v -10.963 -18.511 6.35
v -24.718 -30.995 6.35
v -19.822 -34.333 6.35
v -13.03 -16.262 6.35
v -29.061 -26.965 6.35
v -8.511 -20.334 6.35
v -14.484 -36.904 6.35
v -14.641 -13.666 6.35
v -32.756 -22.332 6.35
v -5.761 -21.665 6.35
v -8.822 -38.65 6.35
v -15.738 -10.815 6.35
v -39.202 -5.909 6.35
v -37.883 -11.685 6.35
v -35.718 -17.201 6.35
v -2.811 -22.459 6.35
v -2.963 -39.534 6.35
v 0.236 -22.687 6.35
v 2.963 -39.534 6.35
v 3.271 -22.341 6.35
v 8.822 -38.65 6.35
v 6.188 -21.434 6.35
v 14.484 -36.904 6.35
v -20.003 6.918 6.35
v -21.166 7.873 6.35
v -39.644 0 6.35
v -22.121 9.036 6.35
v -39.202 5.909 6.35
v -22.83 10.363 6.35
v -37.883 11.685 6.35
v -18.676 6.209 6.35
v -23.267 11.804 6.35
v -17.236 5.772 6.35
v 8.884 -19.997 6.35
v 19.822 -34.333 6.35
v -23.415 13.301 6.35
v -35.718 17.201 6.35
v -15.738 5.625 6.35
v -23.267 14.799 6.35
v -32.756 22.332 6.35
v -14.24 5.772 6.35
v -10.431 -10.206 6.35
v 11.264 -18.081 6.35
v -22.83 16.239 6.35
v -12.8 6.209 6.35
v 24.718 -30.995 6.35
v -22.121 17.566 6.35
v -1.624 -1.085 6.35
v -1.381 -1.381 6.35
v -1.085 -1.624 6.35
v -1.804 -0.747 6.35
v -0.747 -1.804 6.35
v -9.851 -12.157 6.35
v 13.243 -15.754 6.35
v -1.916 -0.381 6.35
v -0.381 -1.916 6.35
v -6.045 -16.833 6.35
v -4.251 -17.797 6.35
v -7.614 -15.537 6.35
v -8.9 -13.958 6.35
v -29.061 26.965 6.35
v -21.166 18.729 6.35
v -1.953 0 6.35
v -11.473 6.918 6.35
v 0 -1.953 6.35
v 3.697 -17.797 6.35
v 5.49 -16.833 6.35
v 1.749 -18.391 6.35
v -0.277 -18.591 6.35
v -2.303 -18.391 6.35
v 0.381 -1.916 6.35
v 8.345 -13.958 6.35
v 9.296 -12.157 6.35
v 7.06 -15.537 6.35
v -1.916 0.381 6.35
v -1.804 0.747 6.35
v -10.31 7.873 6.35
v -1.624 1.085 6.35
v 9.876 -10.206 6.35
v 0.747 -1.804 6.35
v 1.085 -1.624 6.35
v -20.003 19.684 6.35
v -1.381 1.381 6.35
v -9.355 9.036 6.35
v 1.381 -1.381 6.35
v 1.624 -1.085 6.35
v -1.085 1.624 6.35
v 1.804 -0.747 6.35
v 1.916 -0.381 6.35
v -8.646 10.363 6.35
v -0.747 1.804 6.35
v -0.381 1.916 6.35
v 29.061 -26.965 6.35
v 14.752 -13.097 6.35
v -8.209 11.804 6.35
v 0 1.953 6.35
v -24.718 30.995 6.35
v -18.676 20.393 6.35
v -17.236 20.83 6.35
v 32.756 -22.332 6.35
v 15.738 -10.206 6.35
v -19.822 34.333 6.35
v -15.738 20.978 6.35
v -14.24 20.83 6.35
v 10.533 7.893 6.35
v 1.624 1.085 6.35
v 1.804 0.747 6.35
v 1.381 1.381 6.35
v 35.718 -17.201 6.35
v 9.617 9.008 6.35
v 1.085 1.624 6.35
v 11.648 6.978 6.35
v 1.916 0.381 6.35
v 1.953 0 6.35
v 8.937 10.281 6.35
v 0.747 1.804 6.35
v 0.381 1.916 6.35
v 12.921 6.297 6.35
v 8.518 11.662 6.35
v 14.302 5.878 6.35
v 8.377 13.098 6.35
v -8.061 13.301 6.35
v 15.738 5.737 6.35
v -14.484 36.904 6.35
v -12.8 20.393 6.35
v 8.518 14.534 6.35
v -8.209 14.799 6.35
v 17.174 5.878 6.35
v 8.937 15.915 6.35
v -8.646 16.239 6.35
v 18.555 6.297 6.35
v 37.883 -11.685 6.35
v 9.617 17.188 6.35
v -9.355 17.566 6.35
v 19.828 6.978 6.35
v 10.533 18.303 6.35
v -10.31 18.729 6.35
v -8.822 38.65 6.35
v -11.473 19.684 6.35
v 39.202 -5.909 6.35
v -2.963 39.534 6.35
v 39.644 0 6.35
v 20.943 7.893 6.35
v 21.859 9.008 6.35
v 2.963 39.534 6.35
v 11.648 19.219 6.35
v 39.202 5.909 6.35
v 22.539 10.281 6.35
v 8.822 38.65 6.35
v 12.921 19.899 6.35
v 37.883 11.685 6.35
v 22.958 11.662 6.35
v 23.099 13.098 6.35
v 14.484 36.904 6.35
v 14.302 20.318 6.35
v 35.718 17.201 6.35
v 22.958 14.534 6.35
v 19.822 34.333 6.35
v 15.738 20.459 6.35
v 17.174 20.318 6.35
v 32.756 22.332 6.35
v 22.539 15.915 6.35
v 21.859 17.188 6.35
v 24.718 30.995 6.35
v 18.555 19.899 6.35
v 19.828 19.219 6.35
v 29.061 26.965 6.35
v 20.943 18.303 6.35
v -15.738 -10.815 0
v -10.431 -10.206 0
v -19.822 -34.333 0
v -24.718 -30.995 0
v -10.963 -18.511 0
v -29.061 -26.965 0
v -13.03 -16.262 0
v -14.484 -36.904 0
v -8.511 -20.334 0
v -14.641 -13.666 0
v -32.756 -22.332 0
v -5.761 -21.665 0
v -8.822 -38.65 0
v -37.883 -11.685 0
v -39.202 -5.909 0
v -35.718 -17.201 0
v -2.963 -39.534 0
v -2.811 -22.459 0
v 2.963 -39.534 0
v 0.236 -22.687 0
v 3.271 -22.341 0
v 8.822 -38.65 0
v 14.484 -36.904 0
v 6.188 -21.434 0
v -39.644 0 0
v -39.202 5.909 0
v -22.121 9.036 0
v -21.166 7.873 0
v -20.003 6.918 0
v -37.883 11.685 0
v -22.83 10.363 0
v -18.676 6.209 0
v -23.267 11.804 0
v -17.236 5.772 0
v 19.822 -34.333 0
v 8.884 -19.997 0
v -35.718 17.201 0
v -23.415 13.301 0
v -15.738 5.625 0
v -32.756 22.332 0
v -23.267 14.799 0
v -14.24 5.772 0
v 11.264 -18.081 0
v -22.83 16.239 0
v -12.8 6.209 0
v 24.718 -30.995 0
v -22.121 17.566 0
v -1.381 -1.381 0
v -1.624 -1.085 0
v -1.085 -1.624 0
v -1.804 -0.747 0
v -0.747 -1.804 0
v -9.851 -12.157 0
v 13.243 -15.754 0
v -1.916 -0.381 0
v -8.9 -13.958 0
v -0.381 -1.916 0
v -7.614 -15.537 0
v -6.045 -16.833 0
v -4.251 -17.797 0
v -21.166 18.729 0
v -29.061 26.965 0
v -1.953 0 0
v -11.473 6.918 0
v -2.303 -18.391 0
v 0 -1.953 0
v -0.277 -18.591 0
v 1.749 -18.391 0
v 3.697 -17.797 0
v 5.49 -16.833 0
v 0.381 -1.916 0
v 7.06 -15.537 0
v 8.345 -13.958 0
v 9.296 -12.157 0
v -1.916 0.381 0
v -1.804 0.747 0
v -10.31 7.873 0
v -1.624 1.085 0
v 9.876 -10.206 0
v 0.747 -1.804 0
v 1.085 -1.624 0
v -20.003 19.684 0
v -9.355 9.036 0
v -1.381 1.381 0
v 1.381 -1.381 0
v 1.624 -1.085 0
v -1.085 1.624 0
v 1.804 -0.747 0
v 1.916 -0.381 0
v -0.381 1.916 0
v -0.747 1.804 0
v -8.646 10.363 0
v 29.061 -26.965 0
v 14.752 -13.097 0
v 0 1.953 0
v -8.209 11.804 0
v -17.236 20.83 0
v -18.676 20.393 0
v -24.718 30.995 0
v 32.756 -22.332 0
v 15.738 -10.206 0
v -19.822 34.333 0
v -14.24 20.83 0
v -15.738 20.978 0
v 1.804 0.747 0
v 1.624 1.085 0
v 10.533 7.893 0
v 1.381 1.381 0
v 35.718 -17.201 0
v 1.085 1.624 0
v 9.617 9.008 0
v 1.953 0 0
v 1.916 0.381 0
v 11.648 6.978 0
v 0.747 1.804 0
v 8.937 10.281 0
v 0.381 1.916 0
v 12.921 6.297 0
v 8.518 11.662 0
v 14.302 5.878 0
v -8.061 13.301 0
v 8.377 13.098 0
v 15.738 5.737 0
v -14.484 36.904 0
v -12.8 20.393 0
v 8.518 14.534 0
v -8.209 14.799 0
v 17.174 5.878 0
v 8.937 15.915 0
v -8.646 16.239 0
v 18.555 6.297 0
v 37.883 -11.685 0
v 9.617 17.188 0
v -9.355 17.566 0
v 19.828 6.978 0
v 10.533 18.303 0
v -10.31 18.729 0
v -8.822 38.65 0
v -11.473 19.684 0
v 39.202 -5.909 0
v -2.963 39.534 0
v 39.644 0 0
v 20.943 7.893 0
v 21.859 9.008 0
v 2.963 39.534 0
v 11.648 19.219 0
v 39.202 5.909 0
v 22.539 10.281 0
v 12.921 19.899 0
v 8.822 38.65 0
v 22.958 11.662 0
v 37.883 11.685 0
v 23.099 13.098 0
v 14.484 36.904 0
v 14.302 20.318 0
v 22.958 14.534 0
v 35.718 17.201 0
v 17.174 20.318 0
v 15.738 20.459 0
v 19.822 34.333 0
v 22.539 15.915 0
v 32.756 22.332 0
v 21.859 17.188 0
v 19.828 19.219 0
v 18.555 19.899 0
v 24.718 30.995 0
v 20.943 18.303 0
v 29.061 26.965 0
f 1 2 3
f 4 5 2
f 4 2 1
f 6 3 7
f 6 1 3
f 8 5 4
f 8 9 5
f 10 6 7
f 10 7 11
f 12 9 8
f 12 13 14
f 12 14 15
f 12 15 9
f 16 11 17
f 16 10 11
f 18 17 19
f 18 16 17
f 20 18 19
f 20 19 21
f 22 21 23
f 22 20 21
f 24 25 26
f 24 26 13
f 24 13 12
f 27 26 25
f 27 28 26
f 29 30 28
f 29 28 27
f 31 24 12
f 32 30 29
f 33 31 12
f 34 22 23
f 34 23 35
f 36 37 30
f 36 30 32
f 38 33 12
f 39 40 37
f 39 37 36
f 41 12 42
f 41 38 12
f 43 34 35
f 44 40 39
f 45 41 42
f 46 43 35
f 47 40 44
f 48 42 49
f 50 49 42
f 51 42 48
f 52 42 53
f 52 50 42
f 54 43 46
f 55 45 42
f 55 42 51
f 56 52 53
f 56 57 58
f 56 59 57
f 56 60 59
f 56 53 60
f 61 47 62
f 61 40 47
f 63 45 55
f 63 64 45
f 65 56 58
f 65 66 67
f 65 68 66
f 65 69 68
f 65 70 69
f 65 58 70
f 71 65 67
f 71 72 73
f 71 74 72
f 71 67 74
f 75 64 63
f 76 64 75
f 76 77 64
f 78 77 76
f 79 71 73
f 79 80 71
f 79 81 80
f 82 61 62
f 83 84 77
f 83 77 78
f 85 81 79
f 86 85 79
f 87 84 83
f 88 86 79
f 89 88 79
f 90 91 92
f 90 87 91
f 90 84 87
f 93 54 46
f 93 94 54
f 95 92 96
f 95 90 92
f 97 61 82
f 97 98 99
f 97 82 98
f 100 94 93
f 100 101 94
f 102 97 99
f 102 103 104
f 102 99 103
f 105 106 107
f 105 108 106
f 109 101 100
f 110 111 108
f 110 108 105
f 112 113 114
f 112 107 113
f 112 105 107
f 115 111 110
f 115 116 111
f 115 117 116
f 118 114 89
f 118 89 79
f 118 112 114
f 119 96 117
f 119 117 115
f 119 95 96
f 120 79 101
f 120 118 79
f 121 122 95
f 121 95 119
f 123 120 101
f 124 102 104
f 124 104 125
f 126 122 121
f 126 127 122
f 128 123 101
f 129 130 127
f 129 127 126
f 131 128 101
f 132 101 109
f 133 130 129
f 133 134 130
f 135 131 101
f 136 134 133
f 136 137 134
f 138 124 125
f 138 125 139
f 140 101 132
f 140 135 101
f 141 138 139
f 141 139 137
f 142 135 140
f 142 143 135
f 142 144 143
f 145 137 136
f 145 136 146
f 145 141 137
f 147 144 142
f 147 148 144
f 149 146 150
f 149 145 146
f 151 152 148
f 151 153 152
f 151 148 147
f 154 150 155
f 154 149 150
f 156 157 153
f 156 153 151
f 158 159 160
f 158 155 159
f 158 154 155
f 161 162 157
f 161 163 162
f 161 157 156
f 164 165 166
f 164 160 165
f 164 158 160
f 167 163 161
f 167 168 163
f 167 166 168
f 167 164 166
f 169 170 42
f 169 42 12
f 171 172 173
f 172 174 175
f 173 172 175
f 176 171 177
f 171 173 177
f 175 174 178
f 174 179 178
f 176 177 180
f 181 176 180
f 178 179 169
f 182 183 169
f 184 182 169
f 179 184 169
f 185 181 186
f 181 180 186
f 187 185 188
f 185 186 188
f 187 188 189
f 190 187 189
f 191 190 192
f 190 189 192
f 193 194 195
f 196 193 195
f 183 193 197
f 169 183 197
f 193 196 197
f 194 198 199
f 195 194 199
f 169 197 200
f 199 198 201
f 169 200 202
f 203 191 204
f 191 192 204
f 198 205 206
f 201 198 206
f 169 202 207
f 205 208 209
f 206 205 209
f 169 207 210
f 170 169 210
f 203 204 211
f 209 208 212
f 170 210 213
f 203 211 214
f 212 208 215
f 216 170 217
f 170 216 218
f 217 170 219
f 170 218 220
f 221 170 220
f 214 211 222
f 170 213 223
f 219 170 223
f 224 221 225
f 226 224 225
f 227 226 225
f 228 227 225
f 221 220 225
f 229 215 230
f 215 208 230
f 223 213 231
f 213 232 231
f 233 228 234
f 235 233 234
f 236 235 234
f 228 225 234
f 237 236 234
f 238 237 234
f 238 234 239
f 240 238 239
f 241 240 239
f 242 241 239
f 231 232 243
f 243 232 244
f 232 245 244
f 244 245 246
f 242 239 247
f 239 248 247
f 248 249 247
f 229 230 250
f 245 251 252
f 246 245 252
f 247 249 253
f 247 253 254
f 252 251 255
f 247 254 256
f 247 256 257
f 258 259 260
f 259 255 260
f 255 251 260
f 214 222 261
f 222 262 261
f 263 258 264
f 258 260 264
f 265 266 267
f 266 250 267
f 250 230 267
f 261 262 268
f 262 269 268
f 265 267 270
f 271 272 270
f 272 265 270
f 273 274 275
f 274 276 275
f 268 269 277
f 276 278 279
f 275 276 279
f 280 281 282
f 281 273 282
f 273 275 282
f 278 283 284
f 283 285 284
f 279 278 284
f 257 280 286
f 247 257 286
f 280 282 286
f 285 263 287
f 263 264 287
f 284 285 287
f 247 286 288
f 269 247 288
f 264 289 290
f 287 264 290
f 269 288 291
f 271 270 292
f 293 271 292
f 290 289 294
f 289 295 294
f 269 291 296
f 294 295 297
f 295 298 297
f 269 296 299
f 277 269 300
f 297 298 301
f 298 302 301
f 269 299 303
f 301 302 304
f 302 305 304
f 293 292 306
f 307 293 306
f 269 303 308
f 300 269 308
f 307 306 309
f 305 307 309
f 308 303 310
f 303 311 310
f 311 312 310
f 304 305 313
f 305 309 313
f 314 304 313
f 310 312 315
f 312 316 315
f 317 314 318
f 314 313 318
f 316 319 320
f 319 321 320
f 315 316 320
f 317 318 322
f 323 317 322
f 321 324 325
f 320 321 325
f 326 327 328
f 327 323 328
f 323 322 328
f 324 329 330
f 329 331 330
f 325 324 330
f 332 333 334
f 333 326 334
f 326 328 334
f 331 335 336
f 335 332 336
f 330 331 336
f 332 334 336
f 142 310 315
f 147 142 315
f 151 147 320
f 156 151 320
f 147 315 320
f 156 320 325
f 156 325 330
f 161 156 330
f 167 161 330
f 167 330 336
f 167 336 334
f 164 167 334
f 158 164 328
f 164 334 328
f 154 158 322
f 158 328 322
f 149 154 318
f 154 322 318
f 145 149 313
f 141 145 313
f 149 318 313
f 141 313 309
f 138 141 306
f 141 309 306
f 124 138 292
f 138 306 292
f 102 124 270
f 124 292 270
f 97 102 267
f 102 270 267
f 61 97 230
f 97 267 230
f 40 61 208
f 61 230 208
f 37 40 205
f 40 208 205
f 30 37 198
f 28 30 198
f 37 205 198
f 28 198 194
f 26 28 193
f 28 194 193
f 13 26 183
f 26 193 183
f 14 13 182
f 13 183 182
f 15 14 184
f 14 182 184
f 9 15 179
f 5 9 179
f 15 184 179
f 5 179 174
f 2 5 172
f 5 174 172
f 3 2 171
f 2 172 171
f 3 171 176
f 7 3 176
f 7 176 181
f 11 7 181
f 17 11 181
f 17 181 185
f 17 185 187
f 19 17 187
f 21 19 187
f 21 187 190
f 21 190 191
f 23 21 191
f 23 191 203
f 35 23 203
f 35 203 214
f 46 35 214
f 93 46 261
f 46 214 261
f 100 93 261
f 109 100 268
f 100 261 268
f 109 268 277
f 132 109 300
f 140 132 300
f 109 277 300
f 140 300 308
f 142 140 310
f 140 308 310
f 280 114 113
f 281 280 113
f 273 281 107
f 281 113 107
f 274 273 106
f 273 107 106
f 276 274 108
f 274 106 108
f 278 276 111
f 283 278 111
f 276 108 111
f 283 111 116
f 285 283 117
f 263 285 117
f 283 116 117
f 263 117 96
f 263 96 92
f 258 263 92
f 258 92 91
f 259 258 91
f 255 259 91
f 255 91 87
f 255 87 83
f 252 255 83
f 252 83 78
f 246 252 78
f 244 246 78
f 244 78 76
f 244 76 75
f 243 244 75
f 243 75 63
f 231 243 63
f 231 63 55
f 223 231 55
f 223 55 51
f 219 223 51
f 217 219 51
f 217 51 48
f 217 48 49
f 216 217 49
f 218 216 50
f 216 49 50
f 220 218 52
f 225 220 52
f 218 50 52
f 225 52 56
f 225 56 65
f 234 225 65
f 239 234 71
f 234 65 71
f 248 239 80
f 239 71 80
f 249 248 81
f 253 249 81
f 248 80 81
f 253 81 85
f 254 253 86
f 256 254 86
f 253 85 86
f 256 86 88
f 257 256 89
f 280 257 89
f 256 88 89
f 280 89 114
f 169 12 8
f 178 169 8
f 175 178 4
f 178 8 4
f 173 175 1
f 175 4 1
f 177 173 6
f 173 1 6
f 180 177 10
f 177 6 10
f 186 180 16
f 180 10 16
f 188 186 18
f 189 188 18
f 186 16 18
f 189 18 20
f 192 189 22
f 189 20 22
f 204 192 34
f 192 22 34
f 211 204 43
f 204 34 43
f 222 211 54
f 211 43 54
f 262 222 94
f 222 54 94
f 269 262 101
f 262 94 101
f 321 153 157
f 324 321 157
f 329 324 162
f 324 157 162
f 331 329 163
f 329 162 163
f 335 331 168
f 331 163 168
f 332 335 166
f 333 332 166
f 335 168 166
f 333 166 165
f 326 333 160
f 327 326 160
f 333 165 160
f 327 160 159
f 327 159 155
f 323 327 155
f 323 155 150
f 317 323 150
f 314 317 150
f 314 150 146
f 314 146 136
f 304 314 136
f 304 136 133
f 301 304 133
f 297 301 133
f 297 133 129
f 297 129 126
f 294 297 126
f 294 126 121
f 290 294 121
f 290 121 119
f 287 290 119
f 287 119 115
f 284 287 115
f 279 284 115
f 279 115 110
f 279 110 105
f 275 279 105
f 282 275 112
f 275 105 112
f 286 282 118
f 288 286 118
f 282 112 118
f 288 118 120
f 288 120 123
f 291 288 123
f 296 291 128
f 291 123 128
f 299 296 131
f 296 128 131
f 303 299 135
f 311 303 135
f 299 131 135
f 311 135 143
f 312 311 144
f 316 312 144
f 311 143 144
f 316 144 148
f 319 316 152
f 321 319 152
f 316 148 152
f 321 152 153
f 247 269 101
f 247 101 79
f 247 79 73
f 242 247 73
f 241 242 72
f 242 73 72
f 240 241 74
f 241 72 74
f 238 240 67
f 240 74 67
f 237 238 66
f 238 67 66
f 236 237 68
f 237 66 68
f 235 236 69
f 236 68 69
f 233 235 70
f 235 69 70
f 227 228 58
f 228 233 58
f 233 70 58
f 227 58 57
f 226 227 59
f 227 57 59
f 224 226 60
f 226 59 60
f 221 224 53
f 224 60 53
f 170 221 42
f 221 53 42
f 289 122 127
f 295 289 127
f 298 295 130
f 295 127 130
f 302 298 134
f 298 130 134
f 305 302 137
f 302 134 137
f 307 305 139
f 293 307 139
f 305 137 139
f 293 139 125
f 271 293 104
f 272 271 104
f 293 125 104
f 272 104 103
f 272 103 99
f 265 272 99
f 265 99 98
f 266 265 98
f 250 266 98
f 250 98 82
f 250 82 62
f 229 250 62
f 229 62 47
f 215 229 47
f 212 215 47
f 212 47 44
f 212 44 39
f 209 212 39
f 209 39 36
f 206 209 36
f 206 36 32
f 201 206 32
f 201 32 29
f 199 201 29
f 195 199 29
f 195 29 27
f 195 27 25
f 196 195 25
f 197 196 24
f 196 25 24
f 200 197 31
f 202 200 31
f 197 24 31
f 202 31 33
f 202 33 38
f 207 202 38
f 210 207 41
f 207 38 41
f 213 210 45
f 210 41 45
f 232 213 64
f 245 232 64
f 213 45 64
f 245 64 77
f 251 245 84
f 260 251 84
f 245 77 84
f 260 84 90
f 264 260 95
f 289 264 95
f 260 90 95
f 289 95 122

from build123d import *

# Parameters (mm, degrees)
F0_R     = 39.644393
F1_DEPTH = 6.35
F2_R     = 7.676515
F2_R_2   = 7.361152
F2_R_3   = 1.953076
F3_DEPTH = 6.351


with BuildPart() as f1:
    # F0 (on Top) → F1 (new body)
    with BuildSketch(Plane.XY):
        Circle(F0_R)
    extrude(amount=F1_DEPTH)

    # F2 (on face) → F3 (cut, through all)
    with BuildSketch(Plane.XY.offset(6.35)):
        with Locations((-15.738009, 13.301156)):
            Circle(F2_R)
        with Locations((15.738009, 13.098084)):
            Circle(F2_R_2)
        Circle(F2_R_3)
        with BuildLine():
            Line((-10.430831, -10.205741), (-15.738009, -10.814955))
            ThreePointArc((-15.738009, -10.814955), (0.235681, -22.687173), (15.738009, -10.205741))
            Line((15.738009, -10.205741), (9.876276, -10.205741))
            ThreePointArc((9.876276, -10.205741), (-0.277277, -18.591153), (-10.430831, -10.205741))
        make_face()
    extrude(amount=-F3_DEPTH, mode=Mode.SUBTRACT)


solid = f1.part
